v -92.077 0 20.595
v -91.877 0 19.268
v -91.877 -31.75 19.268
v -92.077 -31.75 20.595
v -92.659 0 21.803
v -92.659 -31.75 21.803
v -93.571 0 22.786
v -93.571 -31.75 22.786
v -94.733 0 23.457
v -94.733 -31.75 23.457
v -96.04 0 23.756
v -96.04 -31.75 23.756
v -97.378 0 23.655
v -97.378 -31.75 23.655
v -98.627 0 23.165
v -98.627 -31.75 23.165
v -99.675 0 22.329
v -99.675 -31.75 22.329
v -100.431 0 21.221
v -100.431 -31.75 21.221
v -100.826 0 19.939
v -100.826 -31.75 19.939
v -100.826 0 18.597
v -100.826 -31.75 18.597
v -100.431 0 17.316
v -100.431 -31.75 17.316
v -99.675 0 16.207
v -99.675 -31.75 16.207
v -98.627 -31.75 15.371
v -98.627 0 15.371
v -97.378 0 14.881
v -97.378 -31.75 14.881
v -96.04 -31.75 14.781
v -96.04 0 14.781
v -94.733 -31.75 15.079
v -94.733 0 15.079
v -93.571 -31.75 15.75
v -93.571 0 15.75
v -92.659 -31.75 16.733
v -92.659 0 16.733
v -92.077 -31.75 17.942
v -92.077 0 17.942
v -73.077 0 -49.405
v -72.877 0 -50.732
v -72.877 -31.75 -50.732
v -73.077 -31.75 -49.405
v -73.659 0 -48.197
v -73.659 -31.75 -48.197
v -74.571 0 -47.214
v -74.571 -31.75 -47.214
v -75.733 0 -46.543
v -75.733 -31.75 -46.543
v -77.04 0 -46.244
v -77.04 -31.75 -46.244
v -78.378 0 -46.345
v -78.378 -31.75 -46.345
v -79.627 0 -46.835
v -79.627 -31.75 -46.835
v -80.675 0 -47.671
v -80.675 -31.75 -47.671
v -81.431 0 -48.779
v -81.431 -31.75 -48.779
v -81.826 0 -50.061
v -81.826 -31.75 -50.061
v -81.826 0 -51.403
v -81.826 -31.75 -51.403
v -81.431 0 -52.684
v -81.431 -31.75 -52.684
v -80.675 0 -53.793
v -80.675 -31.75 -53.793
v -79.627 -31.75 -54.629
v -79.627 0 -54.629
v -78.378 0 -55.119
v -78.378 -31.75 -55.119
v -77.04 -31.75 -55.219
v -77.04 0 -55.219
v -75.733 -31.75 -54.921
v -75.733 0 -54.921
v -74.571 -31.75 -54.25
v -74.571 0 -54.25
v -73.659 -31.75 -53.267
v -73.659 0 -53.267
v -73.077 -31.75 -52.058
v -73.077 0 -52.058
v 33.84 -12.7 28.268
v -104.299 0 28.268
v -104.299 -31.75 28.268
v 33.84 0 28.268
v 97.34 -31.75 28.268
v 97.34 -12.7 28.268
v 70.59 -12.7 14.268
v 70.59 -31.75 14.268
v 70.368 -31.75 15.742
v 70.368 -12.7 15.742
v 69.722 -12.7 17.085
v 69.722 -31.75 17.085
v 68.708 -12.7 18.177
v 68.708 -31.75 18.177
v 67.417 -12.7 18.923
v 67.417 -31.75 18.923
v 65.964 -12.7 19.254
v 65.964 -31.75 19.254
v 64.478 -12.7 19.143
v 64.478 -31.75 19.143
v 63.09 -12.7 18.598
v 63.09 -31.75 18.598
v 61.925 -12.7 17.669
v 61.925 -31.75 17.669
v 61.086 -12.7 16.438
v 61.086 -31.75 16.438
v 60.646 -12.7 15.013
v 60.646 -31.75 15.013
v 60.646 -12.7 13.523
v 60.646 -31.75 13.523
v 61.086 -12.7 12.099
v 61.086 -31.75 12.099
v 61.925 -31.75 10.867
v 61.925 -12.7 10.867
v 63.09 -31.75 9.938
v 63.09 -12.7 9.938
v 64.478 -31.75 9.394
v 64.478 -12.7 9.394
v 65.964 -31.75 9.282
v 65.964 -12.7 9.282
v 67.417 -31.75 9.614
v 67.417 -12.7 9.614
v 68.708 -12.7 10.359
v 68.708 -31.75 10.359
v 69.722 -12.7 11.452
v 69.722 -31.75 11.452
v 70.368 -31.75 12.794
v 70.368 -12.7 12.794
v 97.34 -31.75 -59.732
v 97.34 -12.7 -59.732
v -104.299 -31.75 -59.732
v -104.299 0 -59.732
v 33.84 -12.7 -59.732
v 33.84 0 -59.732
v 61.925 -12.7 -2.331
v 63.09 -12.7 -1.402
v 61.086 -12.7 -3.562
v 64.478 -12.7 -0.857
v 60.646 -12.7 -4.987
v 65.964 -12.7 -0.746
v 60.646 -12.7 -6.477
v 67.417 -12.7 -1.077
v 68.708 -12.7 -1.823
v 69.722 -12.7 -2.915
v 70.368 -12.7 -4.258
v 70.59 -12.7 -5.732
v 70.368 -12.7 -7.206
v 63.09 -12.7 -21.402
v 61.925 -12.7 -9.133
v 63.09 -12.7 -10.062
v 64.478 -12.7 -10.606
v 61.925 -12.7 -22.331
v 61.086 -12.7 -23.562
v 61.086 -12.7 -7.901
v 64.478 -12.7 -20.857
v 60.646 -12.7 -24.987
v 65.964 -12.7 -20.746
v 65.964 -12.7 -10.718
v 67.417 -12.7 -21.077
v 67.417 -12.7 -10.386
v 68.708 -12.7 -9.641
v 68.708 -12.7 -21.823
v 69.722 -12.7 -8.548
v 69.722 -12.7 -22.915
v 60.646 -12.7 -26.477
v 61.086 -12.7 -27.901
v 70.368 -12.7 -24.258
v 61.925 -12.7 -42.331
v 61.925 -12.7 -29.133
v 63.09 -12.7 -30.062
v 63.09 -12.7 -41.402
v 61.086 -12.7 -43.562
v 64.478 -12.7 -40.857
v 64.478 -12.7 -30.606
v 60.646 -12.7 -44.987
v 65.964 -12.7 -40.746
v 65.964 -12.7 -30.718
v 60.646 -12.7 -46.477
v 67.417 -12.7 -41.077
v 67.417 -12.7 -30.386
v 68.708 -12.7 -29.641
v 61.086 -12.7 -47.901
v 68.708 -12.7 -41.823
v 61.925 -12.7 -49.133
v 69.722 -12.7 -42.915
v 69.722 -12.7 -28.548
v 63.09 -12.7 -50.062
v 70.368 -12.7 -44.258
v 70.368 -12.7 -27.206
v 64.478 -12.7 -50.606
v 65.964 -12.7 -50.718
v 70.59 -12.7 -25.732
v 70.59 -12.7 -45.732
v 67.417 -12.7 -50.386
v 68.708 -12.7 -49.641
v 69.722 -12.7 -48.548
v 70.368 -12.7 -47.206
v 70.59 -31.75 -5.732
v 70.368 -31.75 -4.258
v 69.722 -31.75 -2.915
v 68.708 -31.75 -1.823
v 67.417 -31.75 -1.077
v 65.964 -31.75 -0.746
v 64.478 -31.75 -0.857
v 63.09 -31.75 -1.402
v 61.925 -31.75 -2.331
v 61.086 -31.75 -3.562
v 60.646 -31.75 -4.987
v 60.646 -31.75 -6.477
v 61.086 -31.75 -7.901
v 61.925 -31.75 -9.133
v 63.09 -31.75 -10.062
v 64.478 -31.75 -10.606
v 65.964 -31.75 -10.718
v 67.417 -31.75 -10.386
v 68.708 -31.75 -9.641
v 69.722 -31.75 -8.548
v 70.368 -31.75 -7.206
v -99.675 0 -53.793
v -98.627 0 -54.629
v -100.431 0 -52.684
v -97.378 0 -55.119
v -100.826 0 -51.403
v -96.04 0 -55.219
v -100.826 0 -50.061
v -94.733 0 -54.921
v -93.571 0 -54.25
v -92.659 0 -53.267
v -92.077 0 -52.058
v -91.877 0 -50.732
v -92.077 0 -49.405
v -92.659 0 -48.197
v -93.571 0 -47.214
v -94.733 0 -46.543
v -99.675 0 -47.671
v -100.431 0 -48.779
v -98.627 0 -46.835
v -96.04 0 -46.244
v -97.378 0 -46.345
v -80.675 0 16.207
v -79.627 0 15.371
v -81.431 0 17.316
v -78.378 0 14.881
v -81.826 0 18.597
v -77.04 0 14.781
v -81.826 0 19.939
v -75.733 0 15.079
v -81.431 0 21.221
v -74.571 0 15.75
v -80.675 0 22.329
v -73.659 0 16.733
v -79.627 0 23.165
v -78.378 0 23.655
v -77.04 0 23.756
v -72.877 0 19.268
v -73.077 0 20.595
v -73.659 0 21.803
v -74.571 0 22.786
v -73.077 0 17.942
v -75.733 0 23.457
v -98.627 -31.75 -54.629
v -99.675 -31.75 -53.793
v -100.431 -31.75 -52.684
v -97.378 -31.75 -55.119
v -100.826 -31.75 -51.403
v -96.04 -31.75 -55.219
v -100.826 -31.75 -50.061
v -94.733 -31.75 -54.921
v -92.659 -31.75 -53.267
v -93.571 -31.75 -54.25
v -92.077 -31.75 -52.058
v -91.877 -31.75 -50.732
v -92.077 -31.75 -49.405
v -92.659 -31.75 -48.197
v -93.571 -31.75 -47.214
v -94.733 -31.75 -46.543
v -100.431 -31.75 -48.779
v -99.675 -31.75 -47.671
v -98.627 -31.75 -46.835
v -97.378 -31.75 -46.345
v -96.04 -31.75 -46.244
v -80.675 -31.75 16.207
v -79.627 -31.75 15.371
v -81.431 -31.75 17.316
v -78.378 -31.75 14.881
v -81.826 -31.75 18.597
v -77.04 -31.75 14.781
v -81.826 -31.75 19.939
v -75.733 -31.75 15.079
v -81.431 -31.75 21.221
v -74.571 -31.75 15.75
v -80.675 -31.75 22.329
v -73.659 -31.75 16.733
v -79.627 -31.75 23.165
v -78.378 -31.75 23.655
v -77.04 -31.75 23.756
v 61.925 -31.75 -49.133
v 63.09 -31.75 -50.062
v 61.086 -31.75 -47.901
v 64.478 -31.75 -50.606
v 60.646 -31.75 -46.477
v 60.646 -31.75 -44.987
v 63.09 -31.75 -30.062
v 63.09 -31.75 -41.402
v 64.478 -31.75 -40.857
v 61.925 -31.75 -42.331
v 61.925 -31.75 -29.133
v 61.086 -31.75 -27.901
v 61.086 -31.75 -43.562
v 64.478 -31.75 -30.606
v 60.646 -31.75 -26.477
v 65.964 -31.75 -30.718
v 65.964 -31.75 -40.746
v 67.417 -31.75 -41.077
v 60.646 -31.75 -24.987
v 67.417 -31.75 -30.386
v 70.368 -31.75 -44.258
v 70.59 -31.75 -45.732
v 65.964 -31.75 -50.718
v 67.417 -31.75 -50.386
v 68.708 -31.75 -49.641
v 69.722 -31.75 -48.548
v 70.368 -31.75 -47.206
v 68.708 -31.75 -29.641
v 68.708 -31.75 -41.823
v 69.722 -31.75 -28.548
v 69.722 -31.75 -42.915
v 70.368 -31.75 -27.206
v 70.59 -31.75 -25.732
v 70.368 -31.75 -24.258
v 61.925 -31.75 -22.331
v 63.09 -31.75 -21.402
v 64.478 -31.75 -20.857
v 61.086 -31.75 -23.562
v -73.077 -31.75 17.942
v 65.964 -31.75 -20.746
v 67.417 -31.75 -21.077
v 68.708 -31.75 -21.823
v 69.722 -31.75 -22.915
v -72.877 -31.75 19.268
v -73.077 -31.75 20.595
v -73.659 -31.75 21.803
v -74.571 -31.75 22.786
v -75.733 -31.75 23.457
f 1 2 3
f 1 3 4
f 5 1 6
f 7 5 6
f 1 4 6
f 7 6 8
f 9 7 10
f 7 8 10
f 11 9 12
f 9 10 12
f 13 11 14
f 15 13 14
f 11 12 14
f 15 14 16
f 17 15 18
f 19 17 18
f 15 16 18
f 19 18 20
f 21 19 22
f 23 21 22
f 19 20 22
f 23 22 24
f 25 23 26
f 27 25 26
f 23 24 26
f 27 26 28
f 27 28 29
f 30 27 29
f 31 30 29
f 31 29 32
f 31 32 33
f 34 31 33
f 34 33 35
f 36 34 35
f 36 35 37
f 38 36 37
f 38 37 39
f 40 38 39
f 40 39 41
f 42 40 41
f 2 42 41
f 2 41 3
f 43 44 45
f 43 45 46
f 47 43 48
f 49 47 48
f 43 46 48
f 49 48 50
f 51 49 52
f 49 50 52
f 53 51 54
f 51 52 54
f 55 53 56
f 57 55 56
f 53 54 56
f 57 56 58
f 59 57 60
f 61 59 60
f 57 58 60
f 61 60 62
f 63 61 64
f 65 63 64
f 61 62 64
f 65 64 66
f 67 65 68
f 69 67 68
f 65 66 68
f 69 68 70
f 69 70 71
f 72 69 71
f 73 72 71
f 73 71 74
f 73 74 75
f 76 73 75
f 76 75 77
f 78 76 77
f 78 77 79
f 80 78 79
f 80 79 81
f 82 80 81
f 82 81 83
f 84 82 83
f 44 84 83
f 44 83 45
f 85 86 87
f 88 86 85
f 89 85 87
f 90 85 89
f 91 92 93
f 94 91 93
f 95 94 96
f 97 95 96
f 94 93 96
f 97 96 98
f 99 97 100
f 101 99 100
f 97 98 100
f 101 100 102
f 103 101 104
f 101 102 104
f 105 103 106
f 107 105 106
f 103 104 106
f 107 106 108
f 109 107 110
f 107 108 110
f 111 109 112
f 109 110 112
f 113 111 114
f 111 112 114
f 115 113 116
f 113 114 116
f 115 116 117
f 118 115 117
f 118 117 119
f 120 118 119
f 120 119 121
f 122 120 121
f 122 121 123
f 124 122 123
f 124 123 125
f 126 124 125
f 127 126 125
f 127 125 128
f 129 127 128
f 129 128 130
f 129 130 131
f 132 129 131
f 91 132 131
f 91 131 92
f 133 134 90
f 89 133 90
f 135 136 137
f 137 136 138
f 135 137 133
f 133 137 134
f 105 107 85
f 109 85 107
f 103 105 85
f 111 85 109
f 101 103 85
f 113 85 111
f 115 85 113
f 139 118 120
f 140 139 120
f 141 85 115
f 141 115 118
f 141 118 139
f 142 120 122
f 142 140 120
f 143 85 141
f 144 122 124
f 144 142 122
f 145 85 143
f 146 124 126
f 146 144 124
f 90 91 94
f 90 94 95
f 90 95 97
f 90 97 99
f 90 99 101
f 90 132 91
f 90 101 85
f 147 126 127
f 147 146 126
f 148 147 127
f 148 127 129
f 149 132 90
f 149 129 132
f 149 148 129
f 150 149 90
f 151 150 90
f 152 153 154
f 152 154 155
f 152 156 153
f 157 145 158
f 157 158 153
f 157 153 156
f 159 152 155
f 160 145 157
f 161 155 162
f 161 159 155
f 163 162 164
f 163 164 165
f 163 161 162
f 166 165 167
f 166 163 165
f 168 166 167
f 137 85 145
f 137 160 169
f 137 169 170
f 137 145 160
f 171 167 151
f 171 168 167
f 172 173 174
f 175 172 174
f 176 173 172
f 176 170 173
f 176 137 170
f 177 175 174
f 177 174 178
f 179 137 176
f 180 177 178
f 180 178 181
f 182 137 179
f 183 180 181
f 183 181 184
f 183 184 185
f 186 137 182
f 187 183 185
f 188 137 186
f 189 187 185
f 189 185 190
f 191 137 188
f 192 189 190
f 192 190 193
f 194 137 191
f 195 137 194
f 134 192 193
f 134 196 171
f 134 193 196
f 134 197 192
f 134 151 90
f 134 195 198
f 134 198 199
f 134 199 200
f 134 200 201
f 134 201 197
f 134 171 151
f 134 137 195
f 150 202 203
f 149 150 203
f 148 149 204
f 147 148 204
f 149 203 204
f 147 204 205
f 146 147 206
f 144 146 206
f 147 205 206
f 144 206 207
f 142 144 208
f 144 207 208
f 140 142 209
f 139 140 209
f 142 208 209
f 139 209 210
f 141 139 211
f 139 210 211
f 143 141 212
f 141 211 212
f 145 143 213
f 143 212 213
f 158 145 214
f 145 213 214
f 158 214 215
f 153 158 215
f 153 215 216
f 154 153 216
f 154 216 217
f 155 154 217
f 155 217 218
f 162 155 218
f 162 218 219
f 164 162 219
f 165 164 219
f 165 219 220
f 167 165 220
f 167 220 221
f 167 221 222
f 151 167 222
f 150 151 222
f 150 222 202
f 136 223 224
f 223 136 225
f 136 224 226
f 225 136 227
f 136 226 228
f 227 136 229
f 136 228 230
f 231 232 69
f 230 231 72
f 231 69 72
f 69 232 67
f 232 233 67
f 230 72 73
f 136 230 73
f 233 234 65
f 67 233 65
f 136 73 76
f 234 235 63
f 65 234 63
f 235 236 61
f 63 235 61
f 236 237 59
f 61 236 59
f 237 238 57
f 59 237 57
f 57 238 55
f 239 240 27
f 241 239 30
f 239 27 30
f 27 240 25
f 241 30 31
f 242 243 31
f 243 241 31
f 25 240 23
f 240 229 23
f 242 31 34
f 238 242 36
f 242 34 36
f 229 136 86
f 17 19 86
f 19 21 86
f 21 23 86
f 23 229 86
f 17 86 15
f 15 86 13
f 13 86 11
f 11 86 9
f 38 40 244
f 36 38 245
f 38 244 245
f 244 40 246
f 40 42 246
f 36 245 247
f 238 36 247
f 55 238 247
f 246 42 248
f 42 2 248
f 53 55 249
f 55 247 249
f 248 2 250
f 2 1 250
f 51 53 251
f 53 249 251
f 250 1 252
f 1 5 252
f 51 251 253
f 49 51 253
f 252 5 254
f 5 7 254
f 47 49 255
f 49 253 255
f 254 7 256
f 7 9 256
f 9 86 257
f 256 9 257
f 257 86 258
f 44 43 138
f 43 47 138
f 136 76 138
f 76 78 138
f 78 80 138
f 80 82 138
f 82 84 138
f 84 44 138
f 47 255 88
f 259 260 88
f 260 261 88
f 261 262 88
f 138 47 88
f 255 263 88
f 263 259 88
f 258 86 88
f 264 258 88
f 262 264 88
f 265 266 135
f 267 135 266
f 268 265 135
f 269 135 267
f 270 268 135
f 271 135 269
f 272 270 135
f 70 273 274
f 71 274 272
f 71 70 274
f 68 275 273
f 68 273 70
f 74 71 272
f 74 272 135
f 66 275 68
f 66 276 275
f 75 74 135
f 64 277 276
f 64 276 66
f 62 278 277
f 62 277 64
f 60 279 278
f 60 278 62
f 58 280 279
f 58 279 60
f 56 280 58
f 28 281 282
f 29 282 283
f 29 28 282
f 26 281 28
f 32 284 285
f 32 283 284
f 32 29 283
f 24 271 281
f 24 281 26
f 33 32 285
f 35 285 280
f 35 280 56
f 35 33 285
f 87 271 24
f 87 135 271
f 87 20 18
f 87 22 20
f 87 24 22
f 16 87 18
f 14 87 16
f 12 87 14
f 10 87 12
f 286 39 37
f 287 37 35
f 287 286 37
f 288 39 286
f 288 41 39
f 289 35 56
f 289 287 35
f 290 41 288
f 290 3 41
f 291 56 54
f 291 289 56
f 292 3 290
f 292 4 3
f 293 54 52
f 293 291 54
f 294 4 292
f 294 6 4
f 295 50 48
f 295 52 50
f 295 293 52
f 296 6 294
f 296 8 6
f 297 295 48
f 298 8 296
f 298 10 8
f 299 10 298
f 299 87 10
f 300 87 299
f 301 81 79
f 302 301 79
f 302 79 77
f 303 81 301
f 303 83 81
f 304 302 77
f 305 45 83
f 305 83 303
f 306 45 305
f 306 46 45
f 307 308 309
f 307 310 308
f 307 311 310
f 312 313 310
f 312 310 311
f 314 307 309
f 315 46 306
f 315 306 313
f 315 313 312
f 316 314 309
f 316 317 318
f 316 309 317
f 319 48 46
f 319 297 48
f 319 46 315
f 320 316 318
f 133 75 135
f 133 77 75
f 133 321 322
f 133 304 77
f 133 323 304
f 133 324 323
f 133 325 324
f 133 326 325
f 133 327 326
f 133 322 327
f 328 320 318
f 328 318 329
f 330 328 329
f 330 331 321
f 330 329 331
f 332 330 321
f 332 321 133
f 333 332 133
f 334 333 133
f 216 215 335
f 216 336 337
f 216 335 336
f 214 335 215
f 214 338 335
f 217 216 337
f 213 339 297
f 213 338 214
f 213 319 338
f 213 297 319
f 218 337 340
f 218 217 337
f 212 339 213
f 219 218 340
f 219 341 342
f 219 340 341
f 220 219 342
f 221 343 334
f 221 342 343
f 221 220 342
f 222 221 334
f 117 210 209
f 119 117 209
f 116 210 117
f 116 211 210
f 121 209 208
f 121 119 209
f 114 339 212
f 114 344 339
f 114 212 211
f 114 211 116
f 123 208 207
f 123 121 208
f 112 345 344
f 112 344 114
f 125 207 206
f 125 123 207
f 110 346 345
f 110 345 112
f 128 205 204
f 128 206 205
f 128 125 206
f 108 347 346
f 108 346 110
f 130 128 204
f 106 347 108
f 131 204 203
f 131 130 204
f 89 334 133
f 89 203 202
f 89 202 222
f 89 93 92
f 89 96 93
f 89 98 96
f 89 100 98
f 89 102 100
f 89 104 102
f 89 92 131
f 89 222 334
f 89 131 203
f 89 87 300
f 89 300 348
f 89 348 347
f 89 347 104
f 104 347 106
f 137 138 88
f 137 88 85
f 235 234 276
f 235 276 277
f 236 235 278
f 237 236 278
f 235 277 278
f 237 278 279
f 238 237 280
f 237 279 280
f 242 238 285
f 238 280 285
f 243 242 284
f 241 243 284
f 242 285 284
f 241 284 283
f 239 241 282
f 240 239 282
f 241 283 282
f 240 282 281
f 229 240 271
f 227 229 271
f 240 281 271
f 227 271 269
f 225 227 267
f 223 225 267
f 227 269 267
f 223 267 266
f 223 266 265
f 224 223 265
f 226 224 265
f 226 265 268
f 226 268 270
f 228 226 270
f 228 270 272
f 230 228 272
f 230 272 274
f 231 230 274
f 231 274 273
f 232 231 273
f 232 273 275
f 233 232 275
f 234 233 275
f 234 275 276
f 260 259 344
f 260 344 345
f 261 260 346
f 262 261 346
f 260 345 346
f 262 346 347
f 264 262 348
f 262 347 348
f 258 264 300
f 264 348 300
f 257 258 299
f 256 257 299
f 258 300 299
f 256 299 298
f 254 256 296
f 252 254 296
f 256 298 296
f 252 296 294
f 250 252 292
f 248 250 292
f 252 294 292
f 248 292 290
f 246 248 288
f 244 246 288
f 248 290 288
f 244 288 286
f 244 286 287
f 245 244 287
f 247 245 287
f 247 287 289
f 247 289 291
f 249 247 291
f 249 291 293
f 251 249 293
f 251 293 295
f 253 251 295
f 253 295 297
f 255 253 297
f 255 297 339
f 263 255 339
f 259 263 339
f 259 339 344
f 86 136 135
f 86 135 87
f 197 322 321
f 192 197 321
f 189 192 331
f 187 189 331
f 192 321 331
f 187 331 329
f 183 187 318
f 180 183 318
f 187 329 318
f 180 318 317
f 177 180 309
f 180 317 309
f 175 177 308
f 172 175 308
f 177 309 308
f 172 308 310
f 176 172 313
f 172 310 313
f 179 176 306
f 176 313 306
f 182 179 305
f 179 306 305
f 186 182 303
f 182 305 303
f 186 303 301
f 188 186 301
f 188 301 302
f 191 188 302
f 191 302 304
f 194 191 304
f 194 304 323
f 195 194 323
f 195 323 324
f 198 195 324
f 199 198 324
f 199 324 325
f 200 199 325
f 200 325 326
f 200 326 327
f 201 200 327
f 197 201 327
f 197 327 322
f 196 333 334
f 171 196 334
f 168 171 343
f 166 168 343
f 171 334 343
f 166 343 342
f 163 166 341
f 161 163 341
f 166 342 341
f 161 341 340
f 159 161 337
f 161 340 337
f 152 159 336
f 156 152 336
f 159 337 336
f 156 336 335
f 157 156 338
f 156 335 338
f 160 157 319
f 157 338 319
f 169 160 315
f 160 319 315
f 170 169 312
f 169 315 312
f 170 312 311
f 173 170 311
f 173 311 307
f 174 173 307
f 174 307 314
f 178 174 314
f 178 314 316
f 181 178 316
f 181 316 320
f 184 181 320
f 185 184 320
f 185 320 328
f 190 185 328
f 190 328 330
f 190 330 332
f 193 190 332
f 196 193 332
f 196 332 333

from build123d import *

# Parameters (mm, degrees)
F0_W     = 201.639
F0_H     = 88
F1_DEPTH = 31.75
F2_W     = 63.5
F2_H     = 12.7
F3_DEPTH = 88.001
F4_R     = 4.5
F4_R_2   = 5
F5_DEPTH = 31.751


with BuildPart() as f1:
    # F0 (on Front) → F1 (new body)
    with BuildSketch(Plane.XZ):
        with Locations((-3.479119, -15.731822)):
            Rectangle(F0_W, F0_H)
    extrude(amount=F1_DEPTH)

    # F2 (on face) → F3 (cut, through all)
    with BuildSketch(Plane(origin=(0, 0, -59.731822), x_dir=(1, 0, 0), z_dir=(0, 0, -1))):
        with Locations((65.590381, 6.35)):
            Rectangle(F2_W, F2_H)
    extrude(amount=-F3_DEPTH, mode=Mode.SUBTRACT)

    # F4 (on face) → F5 (cut, through all)
    with BuildSketch(Plane.XZ.offset(31.75)):
        with Locations((-96.376619, -50.731822)):
            Circle(F4_R)
        with Locations((-96.376619, 19.268178)):
            Circle(F4_R)
        with Locations((-77.376619, -50.731822)):
            Circle(F4_R)
        with Locations((-77.376619, 19.268178)):
            Circle(F4_R)
        with Locations((65.590381, -45.731822)):
            Circle(F4_R_2)
        with Locations((65.590381, -25.731822)):
            Circle(F4_R_2)
        with Locations((65.590381, -5.731822)):
            Circle(F4_R_2)
        with Locations((65.590381, 14.268178)):
            Circle(F4_R_2)
    extrude(amount=-F5_DEPTH, mode=Mode.SUBTRACT)


solid = f1.part
